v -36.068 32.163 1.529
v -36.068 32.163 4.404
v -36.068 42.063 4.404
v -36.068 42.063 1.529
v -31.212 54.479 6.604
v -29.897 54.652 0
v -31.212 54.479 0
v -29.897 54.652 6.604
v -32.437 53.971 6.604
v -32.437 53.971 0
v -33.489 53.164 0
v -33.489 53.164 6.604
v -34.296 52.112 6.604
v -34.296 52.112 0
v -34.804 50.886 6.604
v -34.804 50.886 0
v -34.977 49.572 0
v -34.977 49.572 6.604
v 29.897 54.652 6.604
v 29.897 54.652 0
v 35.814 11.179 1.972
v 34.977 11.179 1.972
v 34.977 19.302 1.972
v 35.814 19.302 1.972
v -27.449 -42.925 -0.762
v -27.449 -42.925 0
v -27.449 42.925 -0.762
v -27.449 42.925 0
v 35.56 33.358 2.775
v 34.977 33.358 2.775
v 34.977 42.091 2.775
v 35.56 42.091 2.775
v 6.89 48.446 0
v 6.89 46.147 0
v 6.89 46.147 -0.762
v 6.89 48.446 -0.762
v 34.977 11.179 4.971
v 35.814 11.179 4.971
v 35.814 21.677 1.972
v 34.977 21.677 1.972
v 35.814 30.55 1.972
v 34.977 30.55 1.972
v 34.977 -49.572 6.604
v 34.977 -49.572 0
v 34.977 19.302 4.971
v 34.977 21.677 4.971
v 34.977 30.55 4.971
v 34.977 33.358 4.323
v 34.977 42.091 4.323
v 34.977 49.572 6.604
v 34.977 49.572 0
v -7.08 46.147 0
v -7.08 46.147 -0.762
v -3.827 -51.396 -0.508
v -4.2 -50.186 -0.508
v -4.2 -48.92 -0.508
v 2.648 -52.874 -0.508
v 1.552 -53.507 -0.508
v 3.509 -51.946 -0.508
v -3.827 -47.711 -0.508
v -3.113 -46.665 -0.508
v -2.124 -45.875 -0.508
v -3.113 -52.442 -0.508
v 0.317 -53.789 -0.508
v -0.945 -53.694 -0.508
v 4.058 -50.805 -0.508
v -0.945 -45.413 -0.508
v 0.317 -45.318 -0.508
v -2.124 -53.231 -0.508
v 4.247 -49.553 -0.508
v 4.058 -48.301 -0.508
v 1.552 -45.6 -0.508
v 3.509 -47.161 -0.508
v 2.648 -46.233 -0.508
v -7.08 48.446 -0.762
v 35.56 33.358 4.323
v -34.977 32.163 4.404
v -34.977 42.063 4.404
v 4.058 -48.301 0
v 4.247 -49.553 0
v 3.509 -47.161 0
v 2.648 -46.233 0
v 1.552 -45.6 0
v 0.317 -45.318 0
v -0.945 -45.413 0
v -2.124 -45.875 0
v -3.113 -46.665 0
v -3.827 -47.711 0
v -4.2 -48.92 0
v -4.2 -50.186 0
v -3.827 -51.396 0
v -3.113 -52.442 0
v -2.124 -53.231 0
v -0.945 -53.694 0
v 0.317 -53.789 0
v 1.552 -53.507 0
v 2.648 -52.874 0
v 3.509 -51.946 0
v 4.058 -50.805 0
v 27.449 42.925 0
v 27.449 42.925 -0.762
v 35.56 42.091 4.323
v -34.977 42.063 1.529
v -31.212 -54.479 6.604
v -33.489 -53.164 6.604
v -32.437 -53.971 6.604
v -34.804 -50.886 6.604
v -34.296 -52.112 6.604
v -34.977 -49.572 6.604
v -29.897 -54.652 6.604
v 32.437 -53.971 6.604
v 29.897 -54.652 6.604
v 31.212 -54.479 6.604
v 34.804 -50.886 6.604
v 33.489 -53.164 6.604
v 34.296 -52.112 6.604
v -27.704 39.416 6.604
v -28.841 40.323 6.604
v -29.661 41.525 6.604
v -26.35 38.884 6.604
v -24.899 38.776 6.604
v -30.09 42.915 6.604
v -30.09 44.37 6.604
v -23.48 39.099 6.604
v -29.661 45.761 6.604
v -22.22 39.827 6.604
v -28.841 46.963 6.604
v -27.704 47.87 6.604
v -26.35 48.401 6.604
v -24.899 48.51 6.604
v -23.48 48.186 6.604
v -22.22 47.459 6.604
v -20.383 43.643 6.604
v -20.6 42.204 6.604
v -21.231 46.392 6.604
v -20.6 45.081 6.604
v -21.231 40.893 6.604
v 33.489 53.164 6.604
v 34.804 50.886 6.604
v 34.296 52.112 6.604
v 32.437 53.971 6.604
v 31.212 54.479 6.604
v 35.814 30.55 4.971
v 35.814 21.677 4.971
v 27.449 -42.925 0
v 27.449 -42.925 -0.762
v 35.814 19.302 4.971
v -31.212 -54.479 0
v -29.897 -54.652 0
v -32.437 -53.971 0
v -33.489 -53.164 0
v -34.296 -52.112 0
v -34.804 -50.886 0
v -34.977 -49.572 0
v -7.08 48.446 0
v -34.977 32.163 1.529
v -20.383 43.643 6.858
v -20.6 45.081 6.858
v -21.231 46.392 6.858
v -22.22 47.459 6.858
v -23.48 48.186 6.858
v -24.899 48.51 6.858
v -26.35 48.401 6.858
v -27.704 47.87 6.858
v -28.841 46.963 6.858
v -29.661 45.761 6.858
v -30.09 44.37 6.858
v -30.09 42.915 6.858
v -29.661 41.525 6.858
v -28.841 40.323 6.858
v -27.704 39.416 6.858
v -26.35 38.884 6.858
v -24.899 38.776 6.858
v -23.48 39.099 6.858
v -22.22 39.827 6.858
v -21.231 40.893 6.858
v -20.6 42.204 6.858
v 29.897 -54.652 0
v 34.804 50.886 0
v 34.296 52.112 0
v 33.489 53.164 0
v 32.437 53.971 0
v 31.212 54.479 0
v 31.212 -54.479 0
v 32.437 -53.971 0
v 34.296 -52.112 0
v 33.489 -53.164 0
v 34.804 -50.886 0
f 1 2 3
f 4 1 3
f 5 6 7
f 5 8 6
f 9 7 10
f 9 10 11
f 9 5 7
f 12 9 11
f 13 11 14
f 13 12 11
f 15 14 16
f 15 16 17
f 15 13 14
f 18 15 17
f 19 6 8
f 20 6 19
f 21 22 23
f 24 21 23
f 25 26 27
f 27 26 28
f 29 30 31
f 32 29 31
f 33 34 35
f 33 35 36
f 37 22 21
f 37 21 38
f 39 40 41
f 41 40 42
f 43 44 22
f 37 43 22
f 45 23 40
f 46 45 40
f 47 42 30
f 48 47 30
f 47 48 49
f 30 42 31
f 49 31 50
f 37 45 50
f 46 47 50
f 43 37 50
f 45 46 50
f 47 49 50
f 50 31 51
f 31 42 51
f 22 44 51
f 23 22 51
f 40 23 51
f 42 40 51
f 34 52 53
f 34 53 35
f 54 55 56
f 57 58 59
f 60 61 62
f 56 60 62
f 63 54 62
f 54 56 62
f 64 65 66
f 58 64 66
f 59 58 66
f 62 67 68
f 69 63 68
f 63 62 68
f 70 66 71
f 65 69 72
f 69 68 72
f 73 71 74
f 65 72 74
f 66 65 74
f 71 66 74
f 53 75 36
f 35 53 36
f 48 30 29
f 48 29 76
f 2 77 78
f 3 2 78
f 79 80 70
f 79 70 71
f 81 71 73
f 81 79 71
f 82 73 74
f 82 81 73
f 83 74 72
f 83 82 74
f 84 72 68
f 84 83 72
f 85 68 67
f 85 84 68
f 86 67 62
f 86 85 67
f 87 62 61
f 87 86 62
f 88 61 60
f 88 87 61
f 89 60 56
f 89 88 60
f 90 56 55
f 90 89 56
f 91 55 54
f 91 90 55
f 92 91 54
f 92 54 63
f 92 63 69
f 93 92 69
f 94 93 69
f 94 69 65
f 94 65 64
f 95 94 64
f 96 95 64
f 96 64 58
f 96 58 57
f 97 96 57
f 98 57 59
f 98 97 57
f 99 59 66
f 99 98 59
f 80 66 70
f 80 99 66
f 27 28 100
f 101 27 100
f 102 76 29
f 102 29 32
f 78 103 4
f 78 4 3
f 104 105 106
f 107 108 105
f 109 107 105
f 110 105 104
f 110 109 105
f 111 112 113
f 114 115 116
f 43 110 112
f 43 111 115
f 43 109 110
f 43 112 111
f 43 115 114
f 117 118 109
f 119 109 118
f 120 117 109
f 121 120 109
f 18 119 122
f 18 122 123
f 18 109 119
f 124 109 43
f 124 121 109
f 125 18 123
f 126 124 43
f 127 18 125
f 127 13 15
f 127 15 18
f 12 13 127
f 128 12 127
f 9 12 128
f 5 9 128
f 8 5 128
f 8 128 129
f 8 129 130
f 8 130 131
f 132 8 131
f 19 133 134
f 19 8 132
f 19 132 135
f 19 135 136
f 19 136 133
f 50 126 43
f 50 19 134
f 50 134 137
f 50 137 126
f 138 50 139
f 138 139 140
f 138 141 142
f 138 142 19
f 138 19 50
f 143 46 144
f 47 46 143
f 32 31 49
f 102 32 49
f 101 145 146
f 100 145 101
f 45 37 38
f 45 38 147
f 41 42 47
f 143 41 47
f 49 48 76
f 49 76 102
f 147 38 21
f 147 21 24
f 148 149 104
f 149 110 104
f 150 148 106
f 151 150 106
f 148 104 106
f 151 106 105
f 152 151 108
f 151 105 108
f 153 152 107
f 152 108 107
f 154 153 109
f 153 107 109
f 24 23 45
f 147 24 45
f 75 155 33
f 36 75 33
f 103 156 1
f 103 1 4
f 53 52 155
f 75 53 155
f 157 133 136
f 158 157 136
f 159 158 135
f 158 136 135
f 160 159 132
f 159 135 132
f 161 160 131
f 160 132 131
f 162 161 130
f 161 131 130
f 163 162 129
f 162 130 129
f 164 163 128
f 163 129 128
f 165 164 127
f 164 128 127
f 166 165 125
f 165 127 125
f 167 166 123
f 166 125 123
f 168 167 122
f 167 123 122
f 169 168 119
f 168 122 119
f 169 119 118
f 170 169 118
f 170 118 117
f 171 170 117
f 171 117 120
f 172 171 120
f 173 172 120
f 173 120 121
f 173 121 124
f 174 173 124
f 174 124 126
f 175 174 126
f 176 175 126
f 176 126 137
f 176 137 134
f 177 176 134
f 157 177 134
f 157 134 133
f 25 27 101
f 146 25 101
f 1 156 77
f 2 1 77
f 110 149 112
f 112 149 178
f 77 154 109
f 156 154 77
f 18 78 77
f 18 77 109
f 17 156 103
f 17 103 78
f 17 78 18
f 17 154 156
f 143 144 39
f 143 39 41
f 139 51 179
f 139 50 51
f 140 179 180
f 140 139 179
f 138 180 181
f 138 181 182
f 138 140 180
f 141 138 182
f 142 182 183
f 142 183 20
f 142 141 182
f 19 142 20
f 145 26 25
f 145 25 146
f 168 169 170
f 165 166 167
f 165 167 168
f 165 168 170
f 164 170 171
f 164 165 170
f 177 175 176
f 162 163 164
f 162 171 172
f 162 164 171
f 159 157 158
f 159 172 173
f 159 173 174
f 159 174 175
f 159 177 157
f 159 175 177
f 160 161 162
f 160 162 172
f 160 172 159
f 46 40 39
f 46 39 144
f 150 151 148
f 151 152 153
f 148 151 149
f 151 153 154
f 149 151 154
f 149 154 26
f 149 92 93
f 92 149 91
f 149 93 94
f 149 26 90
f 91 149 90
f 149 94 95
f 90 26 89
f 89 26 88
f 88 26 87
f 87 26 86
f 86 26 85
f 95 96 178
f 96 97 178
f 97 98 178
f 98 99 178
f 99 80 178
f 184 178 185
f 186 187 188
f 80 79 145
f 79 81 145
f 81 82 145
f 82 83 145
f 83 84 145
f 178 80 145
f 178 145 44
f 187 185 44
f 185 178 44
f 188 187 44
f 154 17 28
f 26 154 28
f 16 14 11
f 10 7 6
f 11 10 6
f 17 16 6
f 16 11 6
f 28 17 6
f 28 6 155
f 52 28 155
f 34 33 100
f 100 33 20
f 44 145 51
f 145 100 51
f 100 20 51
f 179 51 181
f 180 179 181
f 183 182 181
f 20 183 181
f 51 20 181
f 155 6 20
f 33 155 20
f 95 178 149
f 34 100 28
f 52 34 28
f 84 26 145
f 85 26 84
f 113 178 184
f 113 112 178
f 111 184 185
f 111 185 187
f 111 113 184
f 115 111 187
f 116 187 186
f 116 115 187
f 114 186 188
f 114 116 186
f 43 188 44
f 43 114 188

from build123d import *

# Parameters (mm, degrees)
F0_W      = 69.954097271
F0_H      = 109.3032807112
F0_W_2    = 60.0439347327
F0_H_2    = 102.8908193111
F1_DEPTH  = 6.604
F2_R      = 5.08
F3_R      = 5.08
F4_R      = 5.08
F5_R      = 5.08
F7_R      = 4.5439536935
F8_DEPTH  = 5.08
F6_W      = 54.8973716795
F6_H      = 85.8501419425
F10_DEPTH = 0.762
F9_R      = 4.2471129498
F11_DEPTH = 0.508
F12_W     = 11.9684562087
F12_H     = 3.1413002871
F13_DEPTH = 27.432
F14_W     = 9.9000707269
F14_H     = 2.8742142022
F15_DEPTH = 36.068
F16_W     = 8.7329447269
F16_H     = 1.5476101544
F17_DEPTH = 35.56
F18_W     = 8.8735893369
F18_H     = 2.9995241202
F20_DEPTH = 35.814
F19_W     = 8.1237098202
F19_H     = 2.9995241202
F21_DEPTH = 35.814
F22_W     = 7.1957183536
F22_H     = 1.4391434379
F23_DEPTH = 54.61
F24_R     = 4.8808100994
F25_DEPTH = 6.858
F26_W     = 13.9698619023
F26_H     = 2.2988393903
F27_DEPTH = 0.762


with BuildPart() as f1:
    # F0 (on Top) → F1 (new body)
    with BuildSketch(Plane.XY):
        Rectangle(F0_W, F0_H)
        Rectangle(F0_W_2, F0_H_2, mode=Mode.SUBTRACT)
        Rectangle(F0_W_2, F0_H_2)
    extrude(amount=F1_DEPTH)

    # F2
    f2_edges = [f1.edges().sort_by_distance(p)[0] for p in [
        (34.977049, -54.65164, 3.302),
    ]]
    fillet(f2_edges, radius=F2_R)

    # F3
    f3_edges = [f1.edges().sort_by_distance(p)[0] for p in [
        (-34.977049, -54.65164, 3.302),
    ]]
    fillet(f3_edges, radius=F3_R)

    # F4
    f4_edges = [f1.edges().sort_by_distance(p)[0] for p in [
        (34.977049, 54.65164, 3.302),
    ]]
    fillet(f4_edges, radius=F4_R)

    # F5
    f5_edges = [f1.edges().sort_by_distance(p)[0] for p in [
        (-34.977049, 54.65164, 3.302),
    ]]
    fillet(f5_edges, radius=F5_R)

    # F7 (on Top) → F8 (join)
    with BuildSketch(Plane.XY):
        with Locations((0, -49.0902625024)):
            Circle(F7_R)
    extrude(amount=F8_DEPTH)

    # F6 (on Top) → F10 (join)
    with BuildSketch(Plane.XY):
        Rectangle(F6_W, F6_H)
    extrude(amount=-F10_DEPTH)

    # F9 (on Top) → F11 (join)
    with BuildSketch(Plane.XY):
        with Locations((0, -49.5532862842)):
            Circle(F9_R)
    extrude(amount=-F11_DEPTH)

    # F12 (on Right) → F13 (join)
    with BuildSketch(Plane.YZ):
        with Locations((37.5296398997, 3.3532099333)):
            Rectangle(F12_W, F12_H)
    extrude(amount=F13_DEPTH)

    # F14 (on Right) → F15 (join)
    with BuildSketch(Plane.YZ):
        with Locations((37.1129624546, 2.9665301554)):
            Rectangle(F14_W, F14_H)
    extrude(amount=-F15_DEPTH)

    # F16 (on Right) → F17 (join)
    with BuildSketch(Plane.YZ):
        with Locations((37.7242527902, 3.5489225993)):
            Rectangle(F16_W, F16_H)
    extrude(amount=F17_DEPTH)

    # F18 (on Right) → F20 (join)
    with BuildSketch(Plane.YZ):
        with Locations((26.1136516929, 3.4715009388)):
            Rectangle(F18_W, F18_H)
    extrude(amount=F20_DEPTH)

    # F19 (on Right) → F21 (join)
    with BuildSketch(Plane.YZ):
        with Locations((15.2403791435, 3.4715009388)):
            Rectangle(F19_W, F19_H)
    extrude(amount=F21_DEPTH)

    # F22 (on Front) → F23 (join)
    with BuildSketch(Plane.XZ):
        with Locations((-0.2988093765, 3.7136741448)):
            Rectangle(F22_W, F22_H)
    extrude(amount=F23_DEPTH)

    # F24 (on Top) → F25 (join)
    with BuildSketch(Plane.XY):
        with Locations((-25.2635255456, 43.6428338289)):
            Circle(F24_R)
    extrude(amount=F25_DEPTH)

    # F26 (on Top) → F27 (join)
    with BuildSketch(Plane.XY):
        with Locations((-0.0951243564, 47.2962372005)):
            Rectangle(F26_W, F26_H)
    extrude(amount=-F27_DEPTH)


solid = f1.part
